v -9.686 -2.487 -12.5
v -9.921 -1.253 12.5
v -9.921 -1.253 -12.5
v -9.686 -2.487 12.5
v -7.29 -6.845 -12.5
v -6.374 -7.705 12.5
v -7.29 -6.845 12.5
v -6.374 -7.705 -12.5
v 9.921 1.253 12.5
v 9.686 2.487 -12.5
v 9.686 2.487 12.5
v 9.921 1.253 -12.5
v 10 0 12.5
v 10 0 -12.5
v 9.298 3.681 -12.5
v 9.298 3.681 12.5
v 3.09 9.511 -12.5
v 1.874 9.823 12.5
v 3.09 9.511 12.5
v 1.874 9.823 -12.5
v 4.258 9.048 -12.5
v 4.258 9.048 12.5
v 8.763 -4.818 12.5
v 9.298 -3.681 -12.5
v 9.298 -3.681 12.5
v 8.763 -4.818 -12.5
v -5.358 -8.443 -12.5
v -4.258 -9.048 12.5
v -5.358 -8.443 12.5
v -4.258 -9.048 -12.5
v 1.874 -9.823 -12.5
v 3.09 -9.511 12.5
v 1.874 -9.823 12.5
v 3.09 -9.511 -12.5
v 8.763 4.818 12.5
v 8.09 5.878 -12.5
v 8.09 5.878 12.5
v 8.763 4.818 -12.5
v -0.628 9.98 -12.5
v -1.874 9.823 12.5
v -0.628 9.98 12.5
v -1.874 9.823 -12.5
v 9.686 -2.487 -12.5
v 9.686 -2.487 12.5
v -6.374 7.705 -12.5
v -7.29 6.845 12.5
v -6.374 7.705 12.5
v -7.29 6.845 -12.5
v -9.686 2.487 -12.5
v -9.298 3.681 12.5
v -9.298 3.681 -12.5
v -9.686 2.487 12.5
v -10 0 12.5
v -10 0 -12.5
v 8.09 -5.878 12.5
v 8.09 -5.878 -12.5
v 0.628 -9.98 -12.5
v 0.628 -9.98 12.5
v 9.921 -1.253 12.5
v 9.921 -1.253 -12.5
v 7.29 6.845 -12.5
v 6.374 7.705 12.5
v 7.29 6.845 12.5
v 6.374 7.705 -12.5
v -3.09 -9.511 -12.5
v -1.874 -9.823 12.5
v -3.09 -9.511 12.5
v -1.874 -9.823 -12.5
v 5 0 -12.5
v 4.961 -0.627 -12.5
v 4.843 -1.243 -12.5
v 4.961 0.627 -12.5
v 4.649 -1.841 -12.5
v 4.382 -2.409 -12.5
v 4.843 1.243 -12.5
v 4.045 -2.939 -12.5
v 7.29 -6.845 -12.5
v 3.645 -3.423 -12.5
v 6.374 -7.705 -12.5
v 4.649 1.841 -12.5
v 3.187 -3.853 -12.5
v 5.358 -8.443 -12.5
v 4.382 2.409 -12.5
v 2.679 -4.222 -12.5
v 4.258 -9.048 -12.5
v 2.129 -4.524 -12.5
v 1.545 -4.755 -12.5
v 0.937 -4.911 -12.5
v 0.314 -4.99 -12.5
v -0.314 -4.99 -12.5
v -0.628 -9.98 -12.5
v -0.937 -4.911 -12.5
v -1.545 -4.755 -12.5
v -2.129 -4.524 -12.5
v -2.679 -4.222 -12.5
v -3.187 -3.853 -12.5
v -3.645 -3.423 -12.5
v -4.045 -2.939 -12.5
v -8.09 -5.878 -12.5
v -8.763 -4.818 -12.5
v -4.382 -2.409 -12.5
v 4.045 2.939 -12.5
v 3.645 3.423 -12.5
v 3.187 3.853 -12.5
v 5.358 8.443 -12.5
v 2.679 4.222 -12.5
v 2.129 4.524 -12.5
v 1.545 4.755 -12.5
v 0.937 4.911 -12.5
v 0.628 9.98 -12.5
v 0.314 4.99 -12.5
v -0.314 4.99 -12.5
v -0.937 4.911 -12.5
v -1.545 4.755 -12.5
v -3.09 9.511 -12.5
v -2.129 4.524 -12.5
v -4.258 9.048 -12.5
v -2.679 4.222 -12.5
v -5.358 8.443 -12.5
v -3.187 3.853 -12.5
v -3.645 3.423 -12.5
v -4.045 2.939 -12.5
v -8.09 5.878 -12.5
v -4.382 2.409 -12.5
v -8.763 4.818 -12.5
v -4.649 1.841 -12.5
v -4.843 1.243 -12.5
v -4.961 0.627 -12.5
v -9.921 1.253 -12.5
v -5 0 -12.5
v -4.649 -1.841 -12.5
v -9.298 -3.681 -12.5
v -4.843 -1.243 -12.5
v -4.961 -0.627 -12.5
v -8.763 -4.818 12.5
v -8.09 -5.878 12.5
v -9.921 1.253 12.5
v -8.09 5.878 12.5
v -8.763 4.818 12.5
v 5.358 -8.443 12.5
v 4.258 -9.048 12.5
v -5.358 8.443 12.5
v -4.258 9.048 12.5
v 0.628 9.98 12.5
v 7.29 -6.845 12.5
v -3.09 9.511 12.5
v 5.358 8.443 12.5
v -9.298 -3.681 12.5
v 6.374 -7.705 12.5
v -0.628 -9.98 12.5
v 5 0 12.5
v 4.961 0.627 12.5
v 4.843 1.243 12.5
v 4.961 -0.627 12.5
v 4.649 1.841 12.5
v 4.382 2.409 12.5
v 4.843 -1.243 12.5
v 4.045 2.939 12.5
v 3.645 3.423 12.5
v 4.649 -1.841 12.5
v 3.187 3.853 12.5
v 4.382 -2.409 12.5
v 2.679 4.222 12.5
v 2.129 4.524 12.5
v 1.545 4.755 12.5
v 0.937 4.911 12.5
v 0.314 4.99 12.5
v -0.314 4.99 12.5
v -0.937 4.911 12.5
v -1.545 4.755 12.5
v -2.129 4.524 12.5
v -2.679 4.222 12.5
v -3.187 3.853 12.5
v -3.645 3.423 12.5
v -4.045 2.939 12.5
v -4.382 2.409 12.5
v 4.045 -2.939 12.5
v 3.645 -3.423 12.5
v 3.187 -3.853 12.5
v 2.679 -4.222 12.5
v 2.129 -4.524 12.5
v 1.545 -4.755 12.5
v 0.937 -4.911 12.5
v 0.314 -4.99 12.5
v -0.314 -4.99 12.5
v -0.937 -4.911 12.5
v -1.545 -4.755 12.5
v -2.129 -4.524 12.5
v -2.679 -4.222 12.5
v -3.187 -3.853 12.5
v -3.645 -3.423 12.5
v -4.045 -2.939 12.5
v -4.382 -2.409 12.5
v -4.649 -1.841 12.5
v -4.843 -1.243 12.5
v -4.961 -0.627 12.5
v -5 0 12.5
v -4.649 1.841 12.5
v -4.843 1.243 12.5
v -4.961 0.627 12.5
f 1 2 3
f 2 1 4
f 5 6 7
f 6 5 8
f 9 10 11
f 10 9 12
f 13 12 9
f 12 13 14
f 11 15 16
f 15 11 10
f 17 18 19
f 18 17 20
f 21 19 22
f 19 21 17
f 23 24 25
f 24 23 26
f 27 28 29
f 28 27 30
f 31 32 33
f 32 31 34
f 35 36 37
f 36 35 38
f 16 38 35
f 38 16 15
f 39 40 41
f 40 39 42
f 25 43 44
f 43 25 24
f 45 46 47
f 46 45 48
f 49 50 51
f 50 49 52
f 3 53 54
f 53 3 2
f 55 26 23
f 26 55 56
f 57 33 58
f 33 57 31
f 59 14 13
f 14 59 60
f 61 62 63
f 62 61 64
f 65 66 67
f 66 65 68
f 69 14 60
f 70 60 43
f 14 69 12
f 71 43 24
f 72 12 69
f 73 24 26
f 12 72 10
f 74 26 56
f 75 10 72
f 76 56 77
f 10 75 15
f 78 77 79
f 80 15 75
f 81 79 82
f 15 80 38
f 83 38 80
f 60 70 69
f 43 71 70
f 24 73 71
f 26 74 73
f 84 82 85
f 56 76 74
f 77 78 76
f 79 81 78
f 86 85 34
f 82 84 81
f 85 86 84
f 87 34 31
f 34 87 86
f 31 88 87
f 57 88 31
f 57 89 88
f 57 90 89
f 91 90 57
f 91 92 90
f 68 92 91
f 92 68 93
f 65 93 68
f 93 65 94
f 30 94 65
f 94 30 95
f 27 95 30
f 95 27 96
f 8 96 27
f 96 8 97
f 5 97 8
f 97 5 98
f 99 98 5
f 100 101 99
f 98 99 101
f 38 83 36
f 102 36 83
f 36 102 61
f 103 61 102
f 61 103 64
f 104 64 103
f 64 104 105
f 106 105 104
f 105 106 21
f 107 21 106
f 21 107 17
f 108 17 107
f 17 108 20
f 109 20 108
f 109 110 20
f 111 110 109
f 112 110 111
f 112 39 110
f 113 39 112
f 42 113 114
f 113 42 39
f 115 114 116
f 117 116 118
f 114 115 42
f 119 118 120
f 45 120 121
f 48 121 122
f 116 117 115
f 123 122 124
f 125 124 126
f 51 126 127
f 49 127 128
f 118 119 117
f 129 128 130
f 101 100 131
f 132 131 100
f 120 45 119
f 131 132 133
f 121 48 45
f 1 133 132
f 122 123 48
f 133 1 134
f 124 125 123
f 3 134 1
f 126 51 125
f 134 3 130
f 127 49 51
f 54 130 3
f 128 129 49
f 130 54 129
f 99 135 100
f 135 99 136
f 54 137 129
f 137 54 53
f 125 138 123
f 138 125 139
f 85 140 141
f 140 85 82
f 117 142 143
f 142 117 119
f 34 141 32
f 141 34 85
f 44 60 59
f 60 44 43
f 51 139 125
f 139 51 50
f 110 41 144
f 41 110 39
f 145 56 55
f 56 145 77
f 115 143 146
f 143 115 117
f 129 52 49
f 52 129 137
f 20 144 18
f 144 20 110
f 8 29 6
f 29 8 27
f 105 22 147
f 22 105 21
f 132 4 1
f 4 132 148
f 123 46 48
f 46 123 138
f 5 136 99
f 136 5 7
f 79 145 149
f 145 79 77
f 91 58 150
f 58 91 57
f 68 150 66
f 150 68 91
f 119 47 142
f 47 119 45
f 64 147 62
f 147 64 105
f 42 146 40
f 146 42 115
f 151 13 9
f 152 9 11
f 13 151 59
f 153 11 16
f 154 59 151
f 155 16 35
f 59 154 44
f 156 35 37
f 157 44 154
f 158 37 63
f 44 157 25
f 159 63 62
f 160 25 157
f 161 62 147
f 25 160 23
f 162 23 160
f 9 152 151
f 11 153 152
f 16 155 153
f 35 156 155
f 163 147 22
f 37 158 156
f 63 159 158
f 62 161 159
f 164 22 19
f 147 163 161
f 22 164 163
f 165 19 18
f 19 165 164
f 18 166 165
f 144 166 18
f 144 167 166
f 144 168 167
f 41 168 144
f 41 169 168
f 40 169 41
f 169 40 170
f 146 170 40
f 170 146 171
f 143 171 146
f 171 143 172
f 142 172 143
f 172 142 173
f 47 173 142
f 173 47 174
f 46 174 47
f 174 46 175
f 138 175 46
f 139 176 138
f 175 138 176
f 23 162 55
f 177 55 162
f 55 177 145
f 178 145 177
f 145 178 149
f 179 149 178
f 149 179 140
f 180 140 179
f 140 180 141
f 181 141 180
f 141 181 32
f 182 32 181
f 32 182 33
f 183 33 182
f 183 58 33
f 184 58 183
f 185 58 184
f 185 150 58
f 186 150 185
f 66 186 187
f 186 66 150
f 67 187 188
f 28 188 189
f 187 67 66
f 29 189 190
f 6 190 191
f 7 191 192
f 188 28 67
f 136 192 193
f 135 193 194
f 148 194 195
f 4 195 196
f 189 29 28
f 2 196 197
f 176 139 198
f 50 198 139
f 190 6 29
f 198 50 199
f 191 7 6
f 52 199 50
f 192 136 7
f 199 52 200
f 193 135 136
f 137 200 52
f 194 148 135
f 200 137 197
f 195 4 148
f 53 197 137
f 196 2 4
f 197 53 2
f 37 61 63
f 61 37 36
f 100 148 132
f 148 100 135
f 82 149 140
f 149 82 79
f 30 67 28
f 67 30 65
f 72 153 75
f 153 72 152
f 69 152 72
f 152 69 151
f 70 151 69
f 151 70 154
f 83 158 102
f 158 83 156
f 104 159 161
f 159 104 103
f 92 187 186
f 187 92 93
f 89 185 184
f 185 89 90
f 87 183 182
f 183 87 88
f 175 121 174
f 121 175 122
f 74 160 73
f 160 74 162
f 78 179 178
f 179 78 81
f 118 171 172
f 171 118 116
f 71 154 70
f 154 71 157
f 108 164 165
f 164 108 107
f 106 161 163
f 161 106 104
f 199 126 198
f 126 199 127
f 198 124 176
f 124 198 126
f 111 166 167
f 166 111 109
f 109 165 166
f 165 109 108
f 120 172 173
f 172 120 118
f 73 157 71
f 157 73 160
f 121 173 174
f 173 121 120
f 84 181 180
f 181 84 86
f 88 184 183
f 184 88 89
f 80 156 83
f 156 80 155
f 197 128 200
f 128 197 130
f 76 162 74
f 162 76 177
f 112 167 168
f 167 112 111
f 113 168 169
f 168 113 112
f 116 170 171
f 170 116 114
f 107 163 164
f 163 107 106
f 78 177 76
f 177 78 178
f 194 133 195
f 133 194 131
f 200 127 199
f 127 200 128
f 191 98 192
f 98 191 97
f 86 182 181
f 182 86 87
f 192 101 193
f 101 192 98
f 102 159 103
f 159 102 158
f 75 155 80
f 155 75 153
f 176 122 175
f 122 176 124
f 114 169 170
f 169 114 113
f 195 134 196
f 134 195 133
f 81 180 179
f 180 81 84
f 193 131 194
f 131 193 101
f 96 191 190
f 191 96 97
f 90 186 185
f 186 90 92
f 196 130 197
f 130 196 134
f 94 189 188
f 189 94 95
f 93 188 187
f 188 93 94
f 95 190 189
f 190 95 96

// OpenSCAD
$fn = 50;


difference() {
	union() {
		translate(v = [0, 0, -12.5000000000]) {
			cylinder(h = 25, r = 10.0000000000);
		}
	}
	union() {
		translate(v = [0, 0, -100.0000000000]) {
			cylinder(h = 200, r = 5.0000000000);
		}
	}
}
